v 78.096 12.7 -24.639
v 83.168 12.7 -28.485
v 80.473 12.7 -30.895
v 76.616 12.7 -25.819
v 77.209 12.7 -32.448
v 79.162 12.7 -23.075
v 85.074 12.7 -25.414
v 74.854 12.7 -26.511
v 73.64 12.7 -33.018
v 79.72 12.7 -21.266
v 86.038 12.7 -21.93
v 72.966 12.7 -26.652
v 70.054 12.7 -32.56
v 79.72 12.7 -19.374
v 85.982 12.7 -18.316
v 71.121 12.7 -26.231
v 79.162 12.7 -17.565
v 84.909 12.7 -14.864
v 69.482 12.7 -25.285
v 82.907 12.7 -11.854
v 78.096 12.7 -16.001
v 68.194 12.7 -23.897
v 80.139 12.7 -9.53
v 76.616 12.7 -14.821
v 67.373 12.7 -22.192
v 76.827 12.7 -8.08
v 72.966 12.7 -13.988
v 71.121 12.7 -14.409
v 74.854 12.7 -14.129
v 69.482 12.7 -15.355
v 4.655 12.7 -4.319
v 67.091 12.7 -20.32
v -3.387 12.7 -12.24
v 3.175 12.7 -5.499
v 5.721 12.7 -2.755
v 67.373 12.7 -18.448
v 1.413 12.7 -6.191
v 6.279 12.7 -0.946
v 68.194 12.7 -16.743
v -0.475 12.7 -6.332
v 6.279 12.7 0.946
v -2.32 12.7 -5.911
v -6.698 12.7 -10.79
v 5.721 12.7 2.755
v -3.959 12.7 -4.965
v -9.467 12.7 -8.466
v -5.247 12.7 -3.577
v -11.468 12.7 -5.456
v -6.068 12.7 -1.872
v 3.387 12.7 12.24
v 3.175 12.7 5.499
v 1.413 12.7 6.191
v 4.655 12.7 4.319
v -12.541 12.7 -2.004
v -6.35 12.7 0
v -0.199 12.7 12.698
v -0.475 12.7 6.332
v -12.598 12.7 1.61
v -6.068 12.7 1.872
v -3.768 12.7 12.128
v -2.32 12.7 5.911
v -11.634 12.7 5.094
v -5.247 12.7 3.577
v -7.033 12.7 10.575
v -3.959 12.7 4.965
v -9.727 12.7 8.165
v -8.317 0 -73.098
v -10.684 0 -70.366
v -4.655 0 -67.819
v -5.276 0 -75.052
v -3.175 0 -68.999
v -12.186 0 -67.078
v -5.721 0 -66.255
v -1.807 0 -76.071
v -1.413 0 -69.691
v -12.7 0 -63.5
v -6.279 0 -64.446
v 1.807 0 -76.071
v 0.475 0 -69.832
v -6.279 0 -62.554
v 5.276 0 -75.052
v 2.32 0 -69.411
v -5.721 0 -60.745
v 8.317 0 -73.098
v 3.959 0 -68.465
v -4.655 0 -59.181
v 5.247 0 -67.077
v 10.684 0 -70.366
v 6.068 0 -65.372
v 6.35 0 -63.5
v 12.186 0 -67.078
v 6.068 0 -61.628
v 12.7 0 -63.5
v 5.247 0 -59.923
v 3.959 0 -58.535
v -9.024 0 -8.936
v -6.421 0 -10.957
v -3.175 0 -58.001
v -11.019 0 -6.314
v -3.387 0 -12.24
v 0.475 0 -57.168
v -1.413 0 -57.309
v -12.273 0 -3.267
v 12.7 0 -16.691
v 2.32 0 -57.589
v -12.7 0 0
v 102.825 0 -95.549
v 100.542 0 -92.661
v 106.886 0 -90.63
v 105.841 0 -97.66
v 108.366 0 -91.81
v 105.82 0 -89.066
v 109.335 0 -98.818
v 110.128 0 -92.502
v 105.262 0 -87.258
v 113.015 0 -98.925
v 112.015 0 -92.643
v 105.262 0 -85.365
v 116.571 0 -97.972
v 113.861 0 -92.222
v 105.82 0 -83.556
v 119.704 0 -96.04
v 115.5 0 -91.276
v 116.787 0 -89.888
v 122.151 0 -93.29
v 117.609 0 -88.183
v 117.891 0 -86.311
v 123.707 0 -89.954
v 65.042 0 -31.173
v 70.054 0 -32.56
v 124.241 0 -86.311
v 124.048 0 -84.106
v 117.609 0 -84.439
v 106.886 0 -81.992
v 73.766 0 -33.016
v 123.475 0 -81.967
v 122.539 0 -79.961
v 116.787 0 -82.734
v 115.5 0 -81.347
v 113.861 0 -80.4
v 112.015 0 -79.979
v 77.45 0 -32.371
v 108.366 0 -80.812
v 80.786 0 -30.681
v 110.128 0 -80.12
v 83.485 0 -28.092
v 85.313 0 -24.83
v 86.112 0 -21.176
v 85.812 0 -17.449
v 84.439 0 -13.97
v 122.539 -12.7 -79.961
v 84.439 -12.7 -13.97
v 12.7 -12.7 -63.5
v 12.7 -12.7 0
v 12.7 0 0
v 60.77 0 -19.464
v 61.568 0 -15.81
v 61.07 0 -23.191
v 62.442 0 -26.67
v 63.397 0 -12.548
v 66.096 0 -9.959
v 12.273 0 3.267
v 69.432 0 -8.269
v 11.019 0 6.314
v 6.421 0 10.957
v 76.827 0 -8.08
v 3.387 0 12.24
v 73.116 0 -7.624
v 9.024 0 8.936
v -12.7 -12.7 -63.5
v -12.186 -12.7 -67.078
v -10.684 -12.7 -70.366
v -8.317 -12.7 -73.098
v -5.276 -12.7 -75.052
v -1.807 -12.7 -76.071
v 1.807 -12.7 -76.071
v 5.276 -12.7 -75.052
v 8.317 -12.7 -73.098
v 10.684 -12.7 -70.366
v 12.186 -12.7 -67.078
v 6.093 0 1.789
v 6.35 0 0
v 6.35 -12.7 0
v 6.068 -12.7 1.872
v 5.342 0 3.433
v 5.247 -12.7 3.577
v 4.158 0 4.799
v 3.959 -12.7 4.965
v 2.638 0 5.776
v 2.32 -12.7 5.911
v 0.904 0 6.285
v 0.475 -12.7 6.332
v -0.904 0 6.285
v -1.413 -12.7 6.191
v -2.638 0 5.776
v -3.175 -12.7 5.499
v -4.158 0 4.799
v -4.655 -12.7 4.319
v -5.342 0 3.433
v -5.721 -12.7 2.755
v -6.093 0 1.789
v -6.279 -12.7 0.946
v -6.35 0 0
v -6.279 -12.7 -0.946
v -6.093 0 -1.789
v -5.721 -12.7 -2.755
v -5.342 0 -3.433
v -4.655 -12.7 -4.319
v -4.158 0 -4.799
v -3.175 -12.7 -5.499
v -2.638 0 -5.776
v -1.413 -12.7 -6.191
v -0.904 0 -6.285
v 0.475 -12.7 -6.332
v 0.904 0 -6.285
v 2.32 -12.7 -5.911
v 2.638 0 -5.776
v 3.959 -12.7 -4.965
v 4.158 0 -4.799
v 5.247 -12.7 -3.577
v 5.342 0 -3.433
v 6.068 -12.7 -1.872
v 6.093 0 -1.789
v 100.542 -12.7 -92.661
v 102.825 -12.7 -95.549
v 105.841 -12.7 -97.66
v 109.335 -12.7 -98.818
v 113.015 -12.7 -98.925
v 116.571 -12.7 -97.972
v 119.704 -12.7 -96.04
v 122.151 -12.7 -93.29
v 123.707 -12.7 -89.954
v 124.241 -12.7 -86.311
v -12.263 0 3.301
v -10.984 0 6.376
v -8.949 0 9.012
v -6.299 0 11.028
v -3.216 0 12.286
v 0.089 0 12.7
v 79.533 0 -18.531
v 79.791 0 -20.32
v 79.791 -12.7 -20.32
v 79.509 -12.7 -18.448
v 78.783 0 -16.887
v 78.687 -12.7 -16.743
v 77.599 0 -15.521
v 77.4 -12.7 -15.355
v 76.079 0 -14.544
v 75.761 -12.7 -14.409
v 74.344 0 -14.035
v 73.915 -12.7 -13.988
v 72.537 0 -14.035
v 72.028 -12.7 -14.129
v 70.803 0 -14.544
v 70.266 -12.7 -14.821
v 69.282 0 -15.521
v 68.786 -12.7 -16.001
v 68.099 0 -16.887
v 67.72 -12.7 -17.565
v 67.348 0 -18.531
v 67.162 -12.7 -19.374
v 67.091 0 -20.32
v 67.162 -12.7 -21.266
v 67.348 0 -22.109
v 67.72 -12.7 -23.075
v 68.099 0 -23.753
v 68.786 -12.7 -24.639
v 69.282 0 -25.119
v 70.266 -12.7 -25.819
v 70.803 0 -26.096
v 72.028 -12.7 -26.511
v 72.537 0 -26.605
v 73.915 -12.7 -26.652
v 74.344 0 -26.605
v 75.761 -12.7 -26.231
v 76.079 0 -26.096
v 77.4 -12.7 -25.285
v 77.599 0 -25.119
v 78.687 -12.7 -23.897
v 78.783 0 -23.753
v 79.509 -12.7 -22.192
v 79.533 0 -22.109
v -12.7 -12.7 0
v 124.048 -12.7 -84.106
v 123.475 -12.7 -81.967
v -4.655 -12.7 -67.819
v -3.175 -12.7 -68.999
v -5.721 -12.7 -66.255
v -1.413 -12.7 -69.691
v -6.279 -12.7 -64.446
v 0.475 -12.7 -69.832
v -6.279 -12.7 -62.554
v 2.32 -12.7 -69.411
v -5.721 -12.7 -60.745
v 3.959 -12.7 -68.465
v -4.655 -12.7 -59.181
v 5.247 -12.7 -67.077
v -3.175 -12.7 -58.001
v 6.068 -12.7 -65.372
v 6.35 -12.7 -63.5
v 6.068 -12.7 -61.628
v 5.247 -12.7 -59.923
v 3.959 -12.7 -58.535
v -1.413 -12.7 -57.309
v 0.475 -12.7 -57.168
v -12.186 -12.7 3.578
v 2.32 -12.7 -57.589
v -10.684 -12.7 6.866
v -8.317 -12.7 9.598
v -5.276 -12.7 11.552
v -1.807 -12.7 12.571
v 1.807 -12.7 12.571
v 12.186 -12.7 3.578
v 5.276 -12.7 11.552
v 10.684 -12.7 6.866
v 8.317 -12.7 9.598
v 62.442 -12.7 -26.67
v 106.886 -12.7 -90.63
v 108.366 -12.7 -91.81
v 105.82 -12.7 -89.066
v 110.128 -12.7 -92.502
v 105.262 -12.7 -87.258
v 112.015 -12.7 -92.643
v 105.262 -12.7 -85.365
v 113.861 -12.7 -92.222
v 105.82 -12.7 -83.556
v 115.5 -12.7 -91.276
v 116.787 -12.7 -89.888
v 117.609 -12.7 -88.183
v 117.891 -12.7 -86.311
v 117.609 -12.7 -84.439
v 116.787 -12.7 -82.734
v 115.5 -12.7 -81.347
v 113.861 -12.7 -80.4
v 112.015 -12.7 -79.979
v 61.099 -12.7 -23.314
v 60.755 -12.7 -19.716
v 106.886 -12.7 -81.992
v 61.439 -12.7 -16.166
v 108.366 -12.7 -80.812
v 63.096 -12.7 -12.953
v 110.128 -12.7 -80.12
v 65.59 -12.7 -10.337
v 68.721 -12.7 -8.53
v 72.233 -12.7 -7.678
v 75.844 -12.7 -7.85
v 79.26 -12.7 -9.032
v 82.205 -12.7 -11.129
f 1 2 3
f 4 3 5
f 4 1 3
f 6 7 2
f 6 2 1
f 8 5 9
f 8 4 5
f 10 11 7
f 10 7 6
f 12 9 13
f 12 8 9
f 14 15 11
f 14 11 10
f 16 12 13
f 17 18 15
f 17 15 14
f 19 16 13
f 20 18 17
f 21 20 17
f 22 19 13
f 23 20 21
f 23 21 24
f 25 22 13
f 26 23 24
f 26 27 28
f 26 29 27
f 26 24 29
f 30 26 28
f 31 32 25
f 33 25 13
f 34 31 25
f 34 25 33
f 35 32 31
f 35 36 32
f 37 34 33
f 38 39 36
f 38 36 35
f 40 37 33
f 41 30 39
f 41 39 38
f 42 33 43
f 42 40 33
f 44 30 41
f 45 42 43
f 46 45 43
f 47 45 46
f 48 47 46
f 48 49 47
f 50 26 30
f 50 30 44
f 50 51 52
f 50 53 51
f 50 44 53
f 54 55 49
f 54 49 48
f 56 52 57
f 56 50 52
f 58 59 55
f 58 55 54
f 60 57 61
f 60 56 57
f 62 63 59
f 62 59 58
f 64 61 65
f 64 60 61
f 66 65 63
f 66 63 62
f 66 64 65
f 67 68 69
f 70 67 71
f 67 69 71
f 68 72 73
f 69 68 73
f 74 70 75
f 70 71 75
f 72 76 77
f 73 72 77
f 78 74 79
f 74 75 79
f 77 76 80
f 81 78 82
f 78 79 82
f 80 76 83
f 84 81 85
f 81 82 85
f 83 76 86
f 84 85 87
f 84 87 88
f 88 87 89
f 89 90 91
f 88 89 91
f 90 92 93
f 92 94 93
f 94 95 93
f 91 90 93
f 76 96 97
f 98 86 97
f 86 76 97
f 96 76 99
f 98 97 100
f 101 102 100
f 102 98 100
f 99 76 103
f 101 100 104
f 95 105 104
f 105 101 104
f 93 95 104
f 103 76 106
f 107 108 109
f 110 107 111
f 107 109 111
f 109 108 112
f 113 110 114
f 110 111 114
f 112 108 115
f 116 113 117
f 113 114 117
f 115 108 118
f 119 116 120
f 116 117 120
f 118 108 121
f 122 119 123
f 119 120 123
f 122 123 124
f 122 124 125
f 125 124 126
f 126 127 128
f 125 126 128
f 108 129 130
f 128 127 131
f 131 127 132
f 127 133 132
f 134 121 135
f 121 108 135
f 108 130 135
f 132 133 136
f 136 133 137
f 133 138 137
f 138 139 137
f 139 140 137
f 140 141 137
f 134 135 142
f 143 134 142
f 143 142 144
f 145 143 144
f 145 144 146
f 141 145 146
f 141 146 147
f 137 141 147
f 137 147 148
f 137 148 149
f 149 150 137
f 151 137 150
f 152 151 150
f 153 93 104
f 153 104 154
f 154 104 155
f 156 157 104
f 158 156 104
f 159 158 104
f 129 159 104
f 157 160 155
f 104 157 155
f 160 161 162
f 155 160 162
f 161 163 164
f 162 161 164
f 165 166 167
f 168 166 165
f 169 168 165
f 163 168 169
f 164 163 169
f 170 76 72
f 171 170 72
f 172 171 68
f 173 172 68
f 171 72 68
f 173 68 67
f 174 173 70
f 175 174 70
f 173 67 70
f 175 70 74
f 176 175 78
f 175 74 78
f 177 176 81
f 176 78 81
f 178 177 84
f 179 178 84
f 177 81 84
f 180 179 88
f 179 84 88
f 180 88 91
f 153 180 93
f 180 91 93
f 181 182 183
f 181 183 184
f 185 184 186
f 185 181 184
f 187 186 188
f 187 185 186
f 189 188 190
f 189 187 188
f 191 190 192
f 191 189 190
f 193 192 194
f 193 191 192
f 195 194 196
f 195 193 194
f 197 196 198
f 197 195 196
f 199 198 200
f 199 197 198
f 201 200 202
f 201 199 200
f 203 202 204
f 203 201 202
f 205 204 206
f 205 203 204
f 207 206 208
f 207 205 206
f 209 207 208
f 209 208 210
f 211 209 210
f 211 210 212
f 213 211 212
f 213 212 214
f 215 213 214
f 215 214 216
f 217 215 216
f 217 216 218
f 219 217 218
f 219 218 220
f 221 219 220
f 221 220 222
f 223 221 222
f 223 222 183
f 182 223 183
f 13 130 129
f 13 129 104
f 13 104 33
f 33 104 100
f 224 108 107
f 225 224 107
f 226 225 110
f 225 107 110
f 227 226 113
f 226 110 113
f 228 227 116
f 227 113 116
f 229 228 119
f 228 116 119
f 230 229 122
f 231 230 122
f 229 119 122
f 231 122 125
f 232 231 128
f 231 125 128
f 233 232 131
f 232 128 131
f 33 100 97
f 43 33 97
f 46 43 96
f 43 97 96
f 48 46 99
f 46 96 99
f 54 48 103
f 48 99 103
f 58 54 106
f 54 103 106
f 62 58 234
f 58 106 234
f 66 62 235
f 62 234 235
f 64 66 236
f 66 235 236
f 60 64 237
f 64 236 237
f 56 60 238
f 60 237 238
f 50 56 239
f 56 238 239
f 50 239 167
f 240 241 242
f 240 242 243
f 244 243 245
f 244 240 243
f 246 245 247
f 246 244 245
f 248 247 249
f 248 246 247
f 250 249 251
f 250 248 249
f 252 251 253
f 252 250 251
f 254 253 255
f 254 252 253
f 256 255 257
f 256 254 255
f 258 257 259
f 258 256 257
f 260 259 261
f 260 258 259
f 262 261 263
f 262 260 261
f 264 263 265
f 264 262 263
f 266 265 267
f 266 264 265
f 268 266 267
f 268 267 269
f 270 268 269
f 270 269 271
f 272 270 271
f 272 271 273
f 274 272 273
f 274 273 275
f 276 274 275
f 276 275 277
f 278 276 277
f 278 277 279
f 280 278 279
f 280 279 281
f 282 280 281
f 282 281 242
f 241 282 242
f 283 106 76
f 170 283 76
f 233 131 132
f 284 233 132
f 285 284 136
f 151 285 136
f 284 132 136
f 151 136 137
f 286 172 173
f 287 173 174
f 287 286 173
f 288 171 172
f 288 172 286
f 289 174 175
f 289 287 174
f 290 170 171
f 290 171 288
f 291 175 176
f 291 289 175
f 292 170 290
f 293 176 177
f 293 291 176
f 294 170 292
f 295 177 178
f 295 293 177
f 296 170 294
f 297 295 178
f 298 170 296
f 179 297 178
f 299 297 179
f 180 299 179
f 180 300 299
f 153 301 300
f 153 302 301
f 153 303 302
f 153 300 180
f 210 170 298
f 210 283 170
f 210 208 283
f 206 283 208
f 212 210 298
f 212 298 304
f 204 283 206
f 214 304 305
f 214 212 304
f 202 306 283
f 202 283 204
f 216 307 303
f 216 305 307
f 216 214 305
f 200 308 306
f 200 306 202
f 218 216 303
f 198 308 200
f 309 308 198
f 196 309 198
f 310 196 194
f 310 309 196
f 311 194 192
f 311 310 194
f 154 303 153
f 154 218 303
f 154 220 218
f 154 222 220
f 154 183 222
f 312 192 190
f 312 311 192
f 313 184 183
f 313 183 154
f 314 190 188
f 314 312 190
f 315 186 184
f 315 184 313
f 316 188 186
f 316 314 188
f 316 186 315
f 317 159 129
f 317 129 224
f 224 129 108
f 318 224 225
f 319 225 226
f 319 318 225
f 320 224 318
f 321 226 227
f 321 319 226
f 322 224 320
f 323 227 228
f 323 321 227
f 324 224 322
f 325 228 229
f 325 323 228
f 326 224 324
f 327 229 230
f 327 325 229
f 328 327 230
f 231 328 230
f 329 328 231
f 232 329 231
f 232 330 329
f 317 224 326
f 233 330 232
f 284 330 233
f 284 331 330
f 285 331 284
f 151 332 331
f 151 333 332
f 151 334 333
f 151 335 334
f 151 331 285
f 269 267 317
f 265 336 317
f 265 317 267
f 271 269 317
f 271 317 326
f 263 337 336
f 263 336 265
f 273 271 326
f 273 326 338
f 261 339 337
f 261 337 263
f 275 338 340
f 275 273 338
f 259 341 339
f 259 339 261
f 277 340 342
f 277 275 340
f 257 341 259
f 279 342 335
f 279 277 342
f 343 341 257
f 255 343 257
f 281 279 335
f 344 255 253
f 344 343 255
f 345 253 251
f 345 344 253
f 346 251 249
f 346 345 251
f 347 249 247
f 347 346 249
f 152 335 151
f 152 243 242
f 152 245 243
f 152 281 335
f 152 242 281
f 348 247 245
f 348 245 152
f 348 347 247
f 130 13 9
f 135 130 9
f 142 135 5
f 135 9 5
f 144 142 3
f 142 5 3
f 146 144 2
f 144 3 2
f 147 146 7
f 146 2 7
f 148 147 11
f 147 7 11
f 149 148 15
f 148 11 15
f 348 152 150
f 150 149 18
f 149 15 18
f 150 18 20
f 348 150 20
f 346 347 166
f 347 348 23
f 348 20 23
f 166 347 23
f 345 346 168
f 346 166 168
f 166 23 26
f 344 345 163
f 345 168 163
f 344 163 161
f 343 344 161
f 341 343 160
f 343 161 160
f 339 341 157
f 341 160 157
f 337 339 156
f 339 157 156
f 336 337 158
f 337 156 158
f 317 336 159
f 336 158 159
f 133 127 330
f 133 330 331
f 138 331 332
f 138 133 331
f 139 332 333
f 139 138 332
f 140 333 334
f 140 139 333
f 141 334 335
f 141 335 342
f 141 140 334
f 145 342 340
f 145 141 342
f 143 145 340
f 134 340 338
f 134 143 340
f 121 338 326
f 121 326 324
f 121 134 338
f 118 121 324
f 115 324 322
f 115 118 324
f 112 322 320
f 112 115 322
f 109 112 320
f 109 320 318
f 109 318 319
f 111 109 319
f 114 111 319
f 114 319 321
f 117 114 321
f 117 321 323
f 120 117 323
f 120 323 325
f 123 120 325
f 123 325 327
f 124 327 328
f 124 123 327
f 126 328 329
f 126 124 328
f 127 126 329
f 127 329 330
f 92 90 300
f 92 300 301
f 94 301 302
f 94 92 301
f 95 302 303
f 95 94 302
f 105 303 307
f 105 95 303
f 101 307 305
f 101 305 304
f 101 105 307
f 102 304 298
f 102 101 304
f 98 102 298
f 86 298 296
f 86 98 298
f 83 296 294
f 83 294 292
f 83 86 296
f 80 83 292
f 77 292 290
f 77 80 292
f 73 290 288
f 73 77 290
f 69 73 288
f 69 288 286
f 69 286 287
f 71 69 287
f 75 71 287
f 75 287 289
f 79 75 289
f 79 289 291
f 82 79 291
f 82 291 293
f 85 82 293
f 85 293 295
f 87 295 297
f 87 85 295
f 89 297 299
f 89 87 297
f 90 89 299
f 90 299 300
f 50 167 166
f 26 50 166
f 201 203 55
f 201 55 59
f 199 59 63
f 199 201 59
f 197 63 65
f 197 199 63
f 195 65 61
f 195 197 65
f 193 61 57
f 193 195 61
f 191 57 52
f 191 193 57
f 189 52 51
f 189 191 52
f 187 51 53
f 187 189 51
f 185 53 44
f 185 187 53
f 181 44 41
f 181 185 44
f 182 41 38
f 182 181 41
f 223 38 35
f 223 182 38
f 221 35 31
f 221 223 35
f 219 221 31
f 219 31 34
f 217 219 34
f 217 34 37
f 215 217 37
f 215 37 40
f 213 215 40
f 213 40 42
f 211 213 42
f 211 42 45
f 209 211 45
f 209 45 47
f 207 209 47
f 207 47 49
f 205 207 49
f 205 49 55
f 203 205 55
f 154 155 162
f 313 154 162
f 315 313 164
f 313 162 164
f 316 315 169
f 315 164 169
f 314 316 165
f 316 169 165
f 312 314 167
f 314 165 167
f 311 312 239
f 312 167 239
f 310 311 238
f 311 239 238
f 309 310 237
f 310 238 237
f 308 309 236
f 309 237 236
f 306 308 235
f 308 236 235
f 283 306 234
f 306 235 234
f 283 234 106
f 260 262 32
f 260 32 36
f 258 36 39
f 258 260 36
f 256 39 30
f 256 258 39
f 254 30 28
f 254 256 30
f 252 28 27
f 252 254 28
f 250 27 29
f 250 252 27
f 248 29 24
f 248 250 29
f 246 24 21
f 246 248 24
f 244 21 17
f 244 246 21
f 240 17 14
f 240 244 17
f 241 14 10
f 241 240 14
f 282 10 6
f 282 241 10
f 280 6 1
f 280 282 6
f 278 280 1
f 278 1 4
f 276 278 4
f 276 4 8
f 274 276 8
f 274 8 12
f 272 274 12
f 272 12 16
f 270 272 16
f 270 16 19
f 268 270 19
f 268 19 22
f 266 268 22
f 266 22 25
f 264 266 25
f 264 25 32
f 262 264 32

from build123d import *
from build123d import SkipClean  # not in build123d's __all__

# Parameters (mm, degrees)
F0_R     = 6.35
F1_DEPTH = 12.7
F2_R     = 6.35
F3_DEPTH = 12.7
F4_R     = 6.35
F5_DEPTH = 12.7


# Not quite as in the source:
# - after a boolean that leaves OpenCascade's solid faulty, fix() repairs it


with BuildPart() as f1:
    # F0 (on Front) → F1 (new body)
    with BuildSketch(Plane.XZ):
        with BuildLine():
            ThreePointArc((-12.7, 0), (0, -12.7), (12.7, 0))
            ThreePointArc((12.7, 0), (0, 12.7), (-12.7, 0))
        make_face()
        Circle(F0_R, mode=Mode.SUBTRACT)
        with BuildLine():
            Line((12.7, -63.5), (12.7, 0))
            ThreePointArc((12.7, 0), (0, -12.7), (-12.7, 0))
            Line((-12.7, 0), (-12.7, -63.5))
            ThreePointArc((-12.7, -63.5), (0, -50.8), (12.7, -63.5))
        make_face()
        with BuildLine():
            ThreePointArc((-12.7, -63.5), (0, -76.2), (12.7, -63.5))
            ThreePointArc((12.7, -63.5), (0, -50.8), (-12.7, -63.5))
        make_face()
        with Locations((0, -63.5)):
            Circle(F0_R, mode=Mode.SUBTRACT)
    extrude(amount=F1_DEPTH)

    # F2 (on face) → F3 (join)
    with BuildSketch(Plane(origin=(0, 0, 0), x_dir=(-1, 0, 0), z_dir=(0, 1, 0))):
        with BuildLine():
            ThreePointArc((3.3866666667, -12.2401180096), (10.1069448071, -7.6902318994), (12.7, 0))
            ThreePointArc((12.7, 0), (7.6902318994, 10.1069448071), (-3.3866666667, 12.2401180096))
            ThreePointArc((-3.3866666667, 12.2401180096), (-12.2401180096, -3.3866666667), (3.3866666667, -12.2401180096))
        make_face()
        Circle(F2_R, mode=Mode.SUBTRACT)
        with BuildLine():
            ThreePointArc((3.3866666667, -12.2401180096), (-12.2401180096, -3.3866666667), (-3.3866666667, 12.2401180096))
            Line((-3.3866666667, 12.2401180096), (-76.8273747243, -8.0798819904))
            ThreePointArc((-76.8273747243, -8.0798819904), (-65.7504761582, -10.2130551929), (-60.7407080576, -20.32))
            ThreePointArc((-60.7407080576, -20.32), (-63.3337632505, -28.0102318994), (-70.0540413909, -32.5601180096))
            Line((-70.0540413909, -32.5601180096), (3.3866666667, -12.2401180096))
        make_face()
        with BuildLine():
            ThreePointArc((-60.7407080576, -20.32), (-65.7504761582, -10.2130551929), (-76.8273747243, -8.0798819904))
            ThreePointArc((-76.8273747243, -8.0798819904), (-85.6808260672, -23.7066666667), (-70.0540413909, -32.5601180096))
            ThreePointArc((-70.0540413909, -32.5601180096), (-63.3337632505, -28.0102318994), (-60.7407080576, -20.32))
        make_face()
        with Locations((-73.4407080576, -20.32)):
            Circle(F2_R, mode=Mode.SUBTRACT)
    with SkipClean():  # cleaning this boolean's faces spoils the solid; the shape is the same uncleaned
        extrude(amount=F3_DEPTH)

    # F4 (on face) → F5 (join)
    with BuildSketch(Plane.XZ):
        with BuildLine():
            ThreePointArc((62.4421854295, -26.67), (76.7277099304, -32.5872579939), (86.1407080576, -20.32))
            ThreePointArc((86.1407080576, -20.32), (85.7079660515, -17.0329981272), (84.4392306857, -13.97))
            ThreePointArc((84.4392306857, -13.97), (67.0907080576, -9.3214773719), (62.4421854295, -26.67))
        make_face()
        with Locations((73.4407080576, -20.32)):
            Circle(F4_R, mode=Mode.SUBTRACT)
        with BuildLine():
            ThreePointArc((84.4392306857, -13.97), (85.7079660515, -17.0329981272), (86.1407080576, -20.32))
            ThreePointArc((86.1407080576, -20.32), (76.7277099304, -32.5872579939), (62.4421854295, -26.67))
            Line((62.4421854295, -26.67), (100.5421854295, -92.6611357684))
            ThreePointArc((100.5421854295, -92.6611357684), (105.1907080576, -75.3126131403), (122.5392306857, -79.9611357684))
            Line((122.5392306857, -79.9611357684), (84.4392306857, -13.97))
        make_face()
        with BuildLine():
            ThreePointArc((124.2407080576, -86.3111357684), (123.8079660515, -83.0241338956), (122.5392306857, -79.9611357684))
            ThreePointArc((122.5392306857, -79.9611357684), (105.1907080576, -75.3126131403), (100.5421854295, -92.6611357684))
            ThreePointArc((100.5421854295, -92.6611357684), (114.8277099304, -98.5783937622), (124.2407080576, -86.3111357684))
        make_face()
        with Locations((111.5407080576, -86.3111357684)):
            Circle(F4_R, mode=Mode.SUBTRACT)
    extrude(amount=F5_DEPTH)

    add(f1.part.fix(), mode=Mode.REPLACE)


solid = f1.part
